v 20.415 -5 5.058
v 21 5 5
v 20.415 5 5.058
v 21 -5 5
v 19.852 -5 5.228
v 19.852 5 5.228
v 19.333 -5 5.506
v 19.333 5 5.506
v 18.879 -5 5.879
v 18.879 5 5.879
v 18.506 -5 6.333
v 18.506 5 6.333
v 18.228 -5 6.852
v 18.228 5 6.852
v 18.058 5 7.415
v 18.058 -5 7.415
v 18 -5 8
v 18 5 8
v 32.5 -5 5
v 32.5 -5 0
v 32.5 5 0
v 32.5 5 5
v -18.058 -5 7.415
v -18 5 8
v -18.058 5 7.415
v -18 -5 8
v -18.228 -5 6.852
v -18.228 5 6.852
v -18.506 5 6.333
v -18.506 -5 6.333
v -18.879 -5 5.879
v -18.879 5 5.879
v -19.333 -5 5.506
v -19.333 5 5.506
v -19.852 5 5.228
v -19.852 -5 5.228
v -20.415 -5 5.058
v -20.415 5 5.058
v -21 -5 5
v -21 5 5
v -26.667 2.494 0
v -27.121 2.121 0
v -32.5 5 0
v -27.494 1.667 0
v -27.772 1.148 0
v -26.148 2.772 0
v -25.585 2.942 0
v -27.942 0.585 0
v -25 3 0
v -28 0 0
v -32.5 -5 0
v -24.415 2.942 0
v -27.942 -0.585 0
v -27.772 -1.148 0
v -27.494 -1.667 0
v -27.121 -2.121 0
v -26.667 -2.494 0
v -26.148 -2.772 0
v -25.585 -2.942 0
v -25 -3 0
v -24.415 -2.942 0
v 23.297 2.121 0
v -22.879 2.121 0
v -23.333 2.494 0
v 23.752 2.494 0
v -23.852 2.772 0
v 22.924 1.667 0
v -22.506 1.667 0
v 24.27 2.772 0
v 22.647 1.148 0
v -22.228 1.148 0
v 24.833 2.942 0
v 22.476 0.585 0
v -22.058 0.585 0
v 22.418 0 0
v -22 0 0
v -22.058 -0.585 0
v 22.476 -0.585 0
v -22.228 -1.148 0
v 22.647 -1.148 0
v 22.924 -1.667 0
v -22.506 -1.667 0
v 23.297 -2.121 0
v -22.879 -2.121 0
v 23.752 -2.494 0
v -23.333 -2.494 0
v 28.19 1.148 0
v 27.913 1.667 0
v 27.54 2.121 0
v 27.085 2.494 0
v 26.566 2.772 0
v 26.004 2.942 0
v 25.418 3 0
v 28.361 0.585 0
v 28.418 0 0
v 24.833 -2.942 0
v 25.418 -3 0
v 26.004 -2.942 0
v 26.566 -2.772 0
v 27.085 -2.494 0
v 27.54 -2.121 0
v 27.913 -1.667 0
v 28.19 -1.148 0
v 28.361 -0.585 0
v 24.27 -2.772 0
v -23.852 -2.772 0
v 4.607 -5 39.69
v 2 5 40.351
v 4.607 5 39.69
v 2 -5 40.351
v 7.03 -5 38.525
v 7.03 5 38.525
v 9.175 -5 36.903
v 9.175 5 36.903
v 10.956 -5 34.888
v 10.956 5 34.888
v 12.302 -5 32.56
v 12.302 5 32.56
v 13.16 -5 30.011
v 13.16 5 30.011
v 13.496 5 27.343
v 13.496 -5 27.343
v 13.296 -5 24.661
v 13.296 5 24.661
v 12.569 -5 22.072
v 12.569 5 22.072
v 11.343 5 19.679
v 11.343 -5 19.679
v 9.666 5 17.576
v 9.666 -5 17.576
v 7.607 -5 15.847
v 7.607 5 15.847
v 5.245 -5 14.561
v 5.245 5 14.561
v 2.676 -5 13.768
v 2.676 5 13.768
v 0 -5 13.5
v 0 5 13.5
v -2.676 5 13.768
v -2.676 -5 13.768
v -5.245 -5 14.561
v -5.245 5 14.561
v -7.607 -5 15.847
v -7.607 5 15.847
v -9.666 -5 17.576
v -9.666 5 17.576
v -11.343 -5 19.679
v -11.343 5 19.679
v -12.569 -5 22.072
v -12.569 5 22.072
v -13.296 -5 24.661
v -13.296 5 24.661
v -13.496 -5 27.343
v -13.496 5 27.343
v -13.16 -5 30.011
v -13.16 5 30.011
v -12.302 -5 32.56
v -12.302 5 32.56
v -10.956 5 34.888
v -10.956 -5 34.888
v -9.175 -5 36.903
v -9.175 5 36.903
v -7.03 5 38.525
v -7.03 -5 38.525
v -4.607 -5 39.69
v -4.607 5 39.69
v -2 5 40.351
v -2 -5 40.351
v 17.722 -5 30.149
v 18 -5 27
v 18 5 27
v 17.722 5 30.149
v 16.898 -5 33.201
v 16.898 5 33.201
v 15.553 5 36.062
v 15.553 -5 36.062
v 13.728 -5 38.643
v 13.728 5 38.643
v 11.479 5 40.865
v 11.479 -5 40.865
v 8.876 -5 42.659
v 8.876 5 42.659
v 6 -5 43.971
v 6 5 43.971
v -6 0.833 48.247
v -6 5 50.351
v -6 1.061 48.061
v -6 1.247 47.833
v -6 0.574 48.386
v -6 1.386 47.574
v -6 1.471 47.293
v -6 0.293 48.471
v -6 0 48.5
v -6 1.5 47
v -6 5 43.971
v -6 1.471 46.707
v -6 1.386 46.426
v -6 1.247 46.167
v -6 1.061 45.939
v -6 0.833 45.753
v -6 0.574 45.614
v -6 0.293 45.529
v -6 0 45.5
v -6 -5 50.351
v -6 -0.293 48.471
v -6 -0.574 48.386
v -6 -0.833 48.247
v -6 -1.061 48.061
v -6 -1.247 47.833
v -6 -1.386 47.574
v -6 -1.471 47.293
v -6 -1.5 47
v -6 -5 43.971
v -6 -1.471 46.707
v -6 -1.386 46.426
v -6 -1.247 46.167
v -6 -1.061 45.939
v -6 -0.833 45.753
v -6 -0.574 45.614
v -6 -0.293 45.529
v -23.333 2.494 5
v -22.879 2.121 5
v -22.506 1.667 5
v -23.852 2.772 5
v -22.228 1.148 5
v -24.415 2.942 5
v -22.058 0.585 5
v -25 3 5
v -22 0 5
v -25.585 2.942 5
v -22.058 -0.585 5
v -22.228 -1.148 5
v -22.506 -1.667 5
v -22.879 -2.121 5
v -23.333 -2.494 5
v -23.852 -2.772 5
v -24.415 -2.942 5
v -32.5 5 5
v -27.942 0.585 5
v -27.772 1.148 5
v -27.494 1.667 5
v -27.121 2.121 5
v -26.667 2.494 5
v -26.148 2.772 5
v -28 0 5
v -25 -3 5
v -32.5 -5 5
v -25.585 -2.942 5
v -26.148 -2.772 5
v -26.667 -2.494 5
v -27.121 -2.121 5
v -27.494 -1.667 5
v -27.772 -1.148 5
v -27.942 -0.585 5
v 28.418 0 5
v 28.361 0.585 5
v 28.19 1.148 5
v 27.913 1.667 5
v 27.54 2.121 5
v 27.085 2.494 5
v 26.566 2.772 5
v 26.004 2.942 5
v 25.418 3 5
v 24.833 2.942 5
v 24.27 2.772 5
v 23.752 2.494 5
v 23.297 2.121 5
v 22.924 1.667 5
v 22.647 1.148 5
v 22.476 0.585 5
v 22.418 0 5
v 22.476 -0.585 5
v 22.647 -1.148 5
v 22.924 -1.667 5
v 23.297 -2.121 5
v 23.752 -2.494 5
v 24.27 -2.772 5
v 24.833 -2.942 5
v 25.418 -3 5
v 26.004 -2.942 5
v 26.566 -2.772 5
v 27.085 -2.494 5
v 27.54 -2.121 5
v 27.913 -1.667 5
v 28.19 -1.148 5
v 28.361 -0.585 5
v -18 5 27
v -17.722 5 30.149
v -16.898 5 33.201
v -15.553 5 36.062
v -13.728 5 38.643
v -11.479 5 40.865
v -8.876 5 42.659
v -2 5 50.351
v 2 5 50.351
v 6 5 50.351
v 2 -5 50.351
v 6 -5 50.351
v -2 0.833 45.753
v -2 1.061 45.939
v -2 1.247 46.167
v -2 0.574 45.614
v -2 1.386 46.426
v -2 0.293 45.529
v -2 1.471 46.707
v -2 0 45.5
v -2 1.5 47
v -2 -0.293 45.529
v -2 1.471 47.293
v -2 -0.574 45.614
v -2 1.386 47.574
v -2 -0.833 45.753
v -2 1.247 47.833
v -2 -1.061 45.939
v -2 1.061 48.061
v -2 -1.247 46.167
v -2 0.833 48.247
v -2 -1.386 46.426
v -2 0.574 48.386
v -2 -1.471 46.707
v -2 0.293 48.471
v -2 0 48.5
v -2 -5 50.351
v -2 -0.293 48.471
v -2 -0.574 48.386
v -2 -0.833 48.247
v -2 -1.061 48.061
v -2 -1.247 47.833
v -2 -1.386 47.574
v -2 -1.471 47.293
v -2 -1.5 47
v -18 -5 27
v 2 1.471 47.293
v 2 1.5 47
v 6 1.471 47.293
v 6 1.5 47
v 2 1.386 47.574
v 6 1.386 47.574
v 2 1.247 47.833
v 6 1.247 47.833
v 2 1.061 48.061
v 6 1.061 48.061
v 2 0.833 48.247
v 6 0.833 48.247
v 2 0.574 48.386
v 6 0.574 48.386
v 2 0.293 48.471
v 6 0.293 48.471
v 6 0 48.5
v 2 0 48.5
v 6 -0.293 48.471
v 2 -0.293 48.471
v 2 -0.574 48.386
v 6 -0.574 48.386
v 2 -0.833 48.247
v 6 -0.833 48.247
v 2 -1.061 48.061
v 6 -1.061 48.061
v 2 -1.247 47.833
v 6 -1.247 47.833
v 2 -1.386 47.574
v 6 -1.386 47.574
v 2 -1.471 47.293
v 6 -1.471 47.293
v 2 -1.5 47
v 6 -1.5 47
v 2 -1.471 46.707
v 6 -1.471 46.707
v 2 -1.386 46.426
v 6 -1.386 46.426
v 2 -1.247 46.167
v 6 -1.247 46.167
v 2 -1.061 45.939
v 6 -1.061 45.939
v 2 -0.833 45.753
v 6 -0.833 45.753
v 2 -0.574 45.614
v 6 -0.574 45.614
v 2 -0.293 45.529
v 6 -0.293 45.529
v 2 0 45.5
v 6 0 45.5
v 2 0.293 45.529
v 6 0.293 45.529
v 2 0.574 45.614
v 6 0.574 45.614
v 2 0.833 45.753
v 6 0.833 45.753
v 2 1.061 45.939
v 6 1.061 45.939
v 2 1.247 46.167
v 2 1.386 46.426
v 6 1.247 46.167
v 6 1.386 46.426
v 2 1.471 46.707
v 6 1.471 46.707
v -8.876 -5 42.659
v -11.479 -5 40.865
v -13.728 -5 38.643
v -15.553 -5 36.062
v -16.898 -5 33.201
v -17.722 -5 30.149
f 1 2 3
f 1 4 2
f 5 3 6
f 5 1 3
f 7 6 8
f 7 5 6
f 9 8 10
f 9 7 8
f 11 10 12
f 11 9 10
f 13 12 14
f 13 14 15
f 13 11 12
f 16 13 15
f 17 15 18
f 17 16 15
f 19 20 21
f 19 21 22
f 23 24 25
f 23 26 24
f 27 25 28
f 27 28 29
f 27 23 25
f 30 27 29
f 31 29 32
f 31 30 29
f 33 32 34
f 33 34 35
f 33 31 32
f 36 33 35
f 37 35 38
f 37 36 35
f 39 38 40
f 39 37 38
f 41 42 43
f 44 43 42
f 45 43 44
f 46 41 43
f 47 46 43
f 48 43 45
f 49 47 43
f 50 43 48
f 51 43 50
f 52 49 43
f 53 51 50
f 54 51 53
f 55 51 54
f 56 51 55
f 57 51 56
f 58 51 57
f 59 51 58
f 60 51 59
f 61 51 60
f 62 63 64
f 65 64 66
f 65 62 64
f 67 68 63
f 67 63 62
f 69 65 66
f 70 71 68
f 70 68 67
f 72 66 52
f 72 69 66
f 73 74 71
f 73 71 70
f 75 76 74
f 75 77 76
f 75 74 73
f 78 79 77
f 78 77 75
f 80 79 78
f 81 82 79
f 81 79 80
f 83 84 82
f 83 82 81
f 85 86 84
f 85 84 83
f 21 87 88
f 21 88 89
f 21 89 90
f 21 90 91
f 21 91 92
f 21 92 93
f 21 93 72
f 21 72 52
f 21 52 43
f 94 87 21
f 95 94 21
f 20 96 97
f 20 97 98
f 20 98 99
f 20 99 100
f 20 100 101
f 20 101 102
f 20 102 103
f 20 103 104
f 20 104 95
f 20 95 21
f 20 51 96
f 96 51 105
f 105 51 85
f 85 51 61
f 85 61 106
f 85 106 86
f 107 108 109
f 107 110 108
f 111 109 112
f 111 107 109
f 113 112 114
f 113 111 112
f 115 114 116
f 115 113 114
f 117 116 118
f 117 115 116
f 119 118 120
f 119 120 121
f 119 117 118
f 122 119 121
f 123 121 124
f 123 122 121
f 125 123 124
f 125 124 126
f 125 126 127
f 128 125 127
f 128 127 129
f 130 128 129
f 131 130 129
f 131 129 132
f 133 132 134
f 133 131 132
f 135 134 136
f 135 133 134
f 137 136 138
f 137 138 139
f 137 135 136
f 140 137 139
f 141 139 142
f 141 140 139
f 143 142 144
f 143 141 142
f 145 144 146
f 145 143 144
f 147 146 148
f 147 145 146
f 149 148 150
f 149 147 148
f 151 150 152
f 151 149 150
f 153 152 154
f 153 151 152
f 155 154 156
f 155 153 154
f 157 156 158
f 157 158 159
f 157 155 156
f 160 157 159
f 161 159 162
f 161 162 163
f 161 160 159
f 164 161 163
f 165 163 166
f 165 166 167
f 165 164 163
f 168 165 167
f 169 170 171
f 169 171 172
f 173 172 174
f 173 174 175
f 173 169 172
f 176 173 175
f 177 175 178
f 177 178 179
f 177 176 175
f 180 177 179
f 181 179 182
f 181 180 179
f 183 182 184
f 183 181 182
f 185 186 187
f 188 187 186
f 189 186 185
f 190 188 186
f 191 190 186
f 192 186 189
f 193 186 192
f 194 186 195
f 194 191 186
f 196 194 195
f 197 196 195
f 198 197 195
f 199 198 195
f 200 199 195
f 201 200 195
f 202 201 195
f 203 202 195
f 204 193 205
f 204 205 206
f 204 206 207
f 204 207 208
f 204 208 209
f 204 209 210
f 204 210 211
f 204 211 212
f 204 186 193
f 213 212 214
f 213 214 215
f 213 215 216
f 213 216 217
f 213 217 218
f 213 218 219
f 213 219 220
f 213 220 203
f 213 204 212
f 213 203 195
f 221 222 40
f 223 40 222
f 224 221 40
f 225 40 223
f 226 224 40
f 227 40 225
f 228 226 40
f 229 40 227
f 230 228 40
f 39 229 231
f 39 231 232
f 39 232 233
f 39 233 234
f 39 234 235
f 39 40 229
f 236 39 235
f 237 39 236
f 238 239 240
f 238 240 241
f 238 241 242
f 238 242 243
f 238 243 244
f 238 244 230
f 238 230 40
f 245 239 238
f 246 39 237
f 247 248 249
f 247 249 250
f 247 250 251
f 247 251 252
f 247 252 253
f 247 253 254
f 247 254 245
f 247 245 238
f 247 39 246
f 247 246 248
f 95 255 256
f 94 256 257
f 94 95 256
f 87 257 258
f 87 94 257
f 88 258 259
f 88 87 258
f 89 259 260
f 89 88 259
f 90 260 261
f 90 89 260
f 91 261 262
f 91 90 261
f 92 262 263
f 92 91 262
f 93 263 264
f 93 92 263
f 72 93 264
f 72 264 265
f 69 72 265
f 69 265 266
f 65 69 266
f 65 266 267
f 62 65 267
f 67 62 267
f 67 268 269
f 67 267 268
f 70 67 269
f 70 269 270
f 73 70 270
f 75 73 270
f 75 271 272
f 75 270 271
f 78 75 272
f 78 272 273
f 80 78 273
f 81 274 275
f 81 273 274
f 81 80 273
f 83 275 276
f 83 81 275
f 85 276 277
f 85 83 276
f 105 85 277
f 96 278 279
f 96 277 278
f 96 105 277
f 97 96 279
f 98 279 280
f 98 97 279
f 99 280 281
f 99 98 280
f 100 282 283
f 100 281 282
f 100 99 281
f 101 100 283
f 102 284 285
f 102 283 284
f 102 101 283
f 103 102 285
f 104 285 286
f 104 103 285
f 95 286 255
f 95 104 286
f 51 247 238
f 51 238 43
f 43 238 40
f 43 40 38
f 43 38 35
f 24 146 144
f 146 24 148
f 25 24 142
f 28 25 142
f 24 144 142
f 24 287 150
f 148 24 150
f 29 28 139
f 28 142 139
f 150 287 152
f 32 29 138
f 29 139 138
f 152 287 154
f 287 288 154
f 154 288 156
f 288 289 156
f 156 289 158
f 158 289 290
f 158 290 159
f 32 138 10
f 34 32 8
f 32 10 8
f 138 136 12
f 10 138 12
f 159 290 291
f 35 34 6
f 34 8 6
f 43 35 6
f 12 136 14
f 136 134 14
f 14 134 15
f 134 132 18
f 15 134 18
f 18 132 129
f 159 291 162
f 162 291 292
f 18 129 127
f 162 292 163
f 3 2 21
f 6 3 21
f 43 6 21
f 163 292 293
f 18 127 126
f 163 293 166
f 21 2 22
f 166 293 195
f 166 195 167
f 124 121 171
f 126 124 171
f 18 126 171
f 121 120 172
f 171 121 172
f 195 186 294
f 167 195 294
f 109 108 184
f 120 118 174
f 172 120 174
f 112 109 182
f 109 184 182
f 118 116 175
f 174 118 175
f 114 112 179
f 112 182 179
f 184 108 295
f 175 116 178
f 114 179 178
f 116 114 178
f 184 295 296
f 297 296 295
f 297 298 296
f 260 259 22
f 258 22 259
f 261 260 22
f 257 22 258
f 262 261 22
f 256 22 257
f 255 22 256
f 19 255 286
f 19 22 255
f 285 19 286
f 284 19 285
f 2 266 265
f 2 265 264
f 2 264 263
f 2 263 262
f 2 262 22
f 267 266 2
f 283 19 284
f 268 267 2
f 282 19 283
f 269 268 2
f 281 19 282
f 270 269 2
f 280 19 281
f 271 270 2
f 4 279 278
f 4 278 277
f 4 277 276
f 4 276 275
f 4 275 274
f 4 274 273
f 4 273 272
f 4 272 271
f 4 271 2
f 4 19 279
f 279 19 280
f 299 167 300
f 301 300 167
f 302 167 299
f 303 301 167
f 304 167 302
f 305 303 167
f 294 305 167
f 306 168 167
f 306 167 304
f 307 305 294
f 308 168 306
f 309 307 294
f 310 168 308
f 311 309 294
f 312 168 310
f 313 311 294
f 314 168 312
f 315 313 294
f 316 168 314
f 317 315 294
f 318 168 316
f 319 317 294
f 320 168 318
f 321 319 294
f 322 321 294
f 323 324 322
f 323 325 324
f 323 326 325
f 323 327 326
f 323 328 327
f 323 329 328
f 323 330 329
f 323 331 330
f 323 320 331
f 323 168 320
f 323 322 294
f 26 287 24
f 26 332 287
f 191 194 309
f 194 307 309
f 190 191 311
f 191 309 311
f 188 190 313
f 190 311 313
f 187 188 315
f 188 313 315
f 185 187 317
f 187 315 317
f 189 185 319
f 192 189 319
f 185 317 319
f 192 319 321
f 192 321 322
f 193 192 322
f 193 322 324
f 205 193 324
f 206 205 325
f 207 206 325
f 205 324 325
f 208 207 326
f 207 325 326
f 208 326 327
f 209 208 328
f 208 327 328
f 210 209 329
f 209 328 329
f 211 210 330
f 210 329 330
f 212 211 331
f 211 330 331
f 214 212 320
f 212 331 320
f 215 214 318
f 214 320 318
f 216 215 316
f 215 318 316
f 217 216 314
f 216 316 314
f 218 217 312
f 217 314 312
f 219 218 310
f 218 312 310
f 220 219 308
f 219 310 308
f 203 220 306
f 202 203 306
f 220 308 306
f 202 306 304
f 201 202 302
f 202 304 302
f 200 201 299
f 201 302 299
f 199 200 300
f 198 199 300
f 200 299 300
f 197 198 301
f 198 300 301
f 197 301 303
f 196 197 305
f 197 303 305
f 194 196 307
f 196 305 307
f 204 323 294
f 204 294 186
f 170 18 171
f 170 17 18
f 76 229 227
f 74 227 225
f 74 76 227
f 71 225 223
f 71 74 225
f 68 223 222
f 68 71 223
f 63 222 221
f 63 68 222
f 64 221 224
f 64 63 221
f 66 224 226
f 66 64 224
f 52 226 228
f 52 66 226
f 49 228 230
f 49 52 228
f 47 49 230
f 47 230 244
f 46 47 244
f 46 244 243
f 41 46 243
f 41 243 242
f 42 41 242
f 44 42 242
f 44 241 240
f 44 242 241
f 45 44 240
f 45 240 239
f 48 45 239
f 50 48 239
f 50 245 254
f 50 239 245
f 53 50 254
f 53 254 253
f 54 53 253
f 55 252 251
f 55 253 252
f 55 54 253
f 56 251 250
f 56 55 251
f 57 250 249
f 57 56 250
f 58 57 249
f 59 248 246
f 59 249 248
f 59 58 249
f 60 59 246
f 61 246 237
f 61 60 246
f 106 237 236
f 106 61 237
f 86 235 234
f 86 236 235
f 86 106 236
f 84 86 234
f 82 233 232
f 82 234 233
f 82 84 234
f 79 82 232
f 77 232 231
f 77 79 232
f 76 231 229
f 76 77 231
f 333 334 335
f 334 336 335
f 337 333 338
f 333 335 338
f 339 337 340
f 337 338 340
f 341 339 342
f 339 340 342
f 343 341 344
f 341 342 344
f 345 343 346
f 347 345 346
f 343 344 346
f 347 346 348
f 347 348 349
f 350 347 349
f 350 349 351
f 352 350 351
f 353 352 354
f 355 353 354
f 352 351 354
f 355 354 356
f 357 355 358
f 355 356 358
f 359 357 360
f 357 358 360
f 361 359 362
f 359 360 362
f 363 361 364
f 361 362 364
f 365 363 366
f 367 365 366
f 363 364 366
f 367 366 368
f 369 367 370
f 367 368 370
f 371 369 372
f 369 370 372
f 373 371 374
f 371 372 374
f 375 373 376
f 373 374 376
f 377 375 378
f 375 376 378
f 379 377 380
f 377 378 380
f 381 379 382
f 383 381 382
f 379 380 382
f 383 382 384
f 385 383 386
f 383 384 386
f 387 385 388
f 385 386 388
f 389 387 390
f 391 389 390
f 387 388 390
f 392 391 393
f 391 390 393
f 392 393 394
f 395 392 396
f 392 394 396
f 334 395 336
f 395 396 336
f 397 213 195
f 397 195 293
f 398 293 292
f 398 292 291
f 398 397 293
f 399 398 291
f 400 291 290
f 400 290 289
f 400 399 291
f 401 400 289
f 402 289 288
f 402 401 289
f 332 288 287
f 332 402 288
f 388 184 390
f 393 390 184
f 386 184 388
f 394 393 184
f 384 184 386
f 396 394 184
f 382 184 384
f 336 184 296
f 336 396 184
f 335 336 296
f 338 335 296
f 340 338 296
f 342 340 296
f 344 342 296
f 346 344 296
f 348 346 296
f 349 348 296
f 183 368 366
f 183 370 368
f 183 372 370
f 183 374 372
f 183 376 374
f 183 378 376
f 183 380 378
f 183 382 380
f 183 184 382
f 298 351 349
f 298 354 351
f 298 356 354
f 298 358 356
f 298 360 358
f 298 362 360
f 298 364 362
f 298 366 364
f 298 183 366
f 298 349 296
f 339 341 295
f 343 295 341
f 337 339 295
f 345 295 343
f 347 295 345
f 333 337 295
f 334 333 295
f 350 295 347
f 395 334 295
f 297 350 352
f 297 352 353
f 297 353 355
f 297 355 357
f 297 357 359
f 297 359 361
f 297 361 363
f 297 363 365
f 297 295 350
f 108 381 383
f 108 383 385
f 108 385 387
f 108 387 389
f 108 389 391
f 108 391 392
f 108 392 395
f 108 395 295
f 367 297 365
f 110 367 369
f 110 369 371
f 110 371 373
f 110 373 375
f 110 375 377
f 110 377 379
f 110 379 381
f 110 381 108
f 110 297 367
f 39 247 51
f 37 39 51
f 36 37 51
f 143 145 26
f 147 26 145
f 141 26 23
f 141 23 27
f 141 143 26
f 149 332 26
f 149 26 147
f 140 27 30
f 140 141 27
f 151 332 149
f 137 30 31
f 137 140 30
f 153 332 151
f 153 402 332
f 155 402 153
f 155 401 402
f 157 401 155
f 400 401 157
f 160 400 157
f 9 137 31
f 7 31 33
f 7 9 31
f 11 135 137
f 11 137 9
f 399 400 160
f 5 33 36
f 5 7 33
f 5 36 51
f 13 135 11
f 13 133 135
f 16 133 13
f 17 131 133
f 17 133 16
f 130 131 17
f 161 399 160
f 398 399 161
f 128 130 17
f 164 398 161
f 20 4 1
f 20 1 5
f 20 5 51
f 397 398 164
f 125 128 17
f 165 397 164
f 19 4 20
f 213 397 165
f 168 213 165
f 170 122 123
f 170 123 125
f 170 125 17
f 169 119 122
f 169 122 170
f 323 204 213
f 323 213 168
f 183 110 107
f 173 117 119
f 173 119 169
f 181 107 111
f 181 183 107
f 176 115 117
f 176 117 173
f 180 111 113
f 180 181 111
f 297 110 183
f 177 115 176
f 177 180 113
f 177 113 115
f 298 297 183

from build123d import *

# Parameters (mm, degrees)
F1_DEPTH = 5
F2_R     = 1.5
F3_DEPTH = 12.5
F5_R     = 3
F6_R     = 3
F7_DEPTH = 25


with BuildPart() as f1:
    # F0 (on Front) → F1 (new body, symmetric)
    with BuildSketch(Plane.XZ):
        with BuildLine():
            ThreePointArc((2, 40.35103), (0, 13.5), (-2, 40.35103))
            Line((-2, 40.35103), (-2, 40.404946))
            Line((-2, 40.404946), (-2, 50.35103))
            Line((-2, 50.35103), (-6, 50.35103))
            Line((-6, 50.35103), (-6, 43.970563))
            ThreePointArc((-6, 43.970563), (-14.696938, 37.392305), (-18, 27))
            Line((-18, 27), (-18, 5))
            Line((-18, 5), (-32.5, 5))
            Line((-32.5, 5), (-32.5, 0))
            Line((-32.5, 0), (-15, 0))
            Line((-15, 0), (15, 0))
            Line((15, 0), (32.5, 0))
            Line((32.5, 0), (32.5, 5))
            Line((32.5, 5), (18, 5))
            Line((18, 5), (18, 27))
            ThreePointArc((18, 27), (14.696938, 37.392305), (6, 43.970563))
            Line((6, 43.970563), (6, 50.35103))
            Line((6, 50.35103), (2, 50.35103))
            Line((2, 50.35103), (2, 40.35103))
        make_face()
    extrude(amount=F1_DEPTH, both=True)


with BuildPart() as f3:
    # F2 (on Right) → F3 (new body, symmetric)
    with BuildSketch(Plane.YZ):
        with Locations((0, 47)):
            Circle(F2_R)
    extrude(amount=F3_DEPTH, both=True)


with BuildPart() as f1_1:
    add(f1.part)

    # F4: cut F3
    add(f3.part, mode=Mode.SUBTRACT)

    # F5
    f5_edges = [f1_1.edges().sort_by_distance(p)[0] for p in [
        (18, 0, 5),
        (-18, 0, 5),
    ]]
    fillet(f5_edges, radius=F5_R)


with BuildPart() as f7:
    # F6 (on Top) → F7 (new body)
    with BuildSketch(Plane.XY):
        with Locations((-25, 0)):
            Circle(F6_R)
        with Locations((25.418336, 0)):
            Circle(F6_R)
    extrude(amount=F7_DEPTH)


with BuildPart() as f1_2:
    add(f1_1.part)

    # F8: cut F7
    add(f7.part, mode=Mode.SUBTRACT)


solid = f1_2.part
